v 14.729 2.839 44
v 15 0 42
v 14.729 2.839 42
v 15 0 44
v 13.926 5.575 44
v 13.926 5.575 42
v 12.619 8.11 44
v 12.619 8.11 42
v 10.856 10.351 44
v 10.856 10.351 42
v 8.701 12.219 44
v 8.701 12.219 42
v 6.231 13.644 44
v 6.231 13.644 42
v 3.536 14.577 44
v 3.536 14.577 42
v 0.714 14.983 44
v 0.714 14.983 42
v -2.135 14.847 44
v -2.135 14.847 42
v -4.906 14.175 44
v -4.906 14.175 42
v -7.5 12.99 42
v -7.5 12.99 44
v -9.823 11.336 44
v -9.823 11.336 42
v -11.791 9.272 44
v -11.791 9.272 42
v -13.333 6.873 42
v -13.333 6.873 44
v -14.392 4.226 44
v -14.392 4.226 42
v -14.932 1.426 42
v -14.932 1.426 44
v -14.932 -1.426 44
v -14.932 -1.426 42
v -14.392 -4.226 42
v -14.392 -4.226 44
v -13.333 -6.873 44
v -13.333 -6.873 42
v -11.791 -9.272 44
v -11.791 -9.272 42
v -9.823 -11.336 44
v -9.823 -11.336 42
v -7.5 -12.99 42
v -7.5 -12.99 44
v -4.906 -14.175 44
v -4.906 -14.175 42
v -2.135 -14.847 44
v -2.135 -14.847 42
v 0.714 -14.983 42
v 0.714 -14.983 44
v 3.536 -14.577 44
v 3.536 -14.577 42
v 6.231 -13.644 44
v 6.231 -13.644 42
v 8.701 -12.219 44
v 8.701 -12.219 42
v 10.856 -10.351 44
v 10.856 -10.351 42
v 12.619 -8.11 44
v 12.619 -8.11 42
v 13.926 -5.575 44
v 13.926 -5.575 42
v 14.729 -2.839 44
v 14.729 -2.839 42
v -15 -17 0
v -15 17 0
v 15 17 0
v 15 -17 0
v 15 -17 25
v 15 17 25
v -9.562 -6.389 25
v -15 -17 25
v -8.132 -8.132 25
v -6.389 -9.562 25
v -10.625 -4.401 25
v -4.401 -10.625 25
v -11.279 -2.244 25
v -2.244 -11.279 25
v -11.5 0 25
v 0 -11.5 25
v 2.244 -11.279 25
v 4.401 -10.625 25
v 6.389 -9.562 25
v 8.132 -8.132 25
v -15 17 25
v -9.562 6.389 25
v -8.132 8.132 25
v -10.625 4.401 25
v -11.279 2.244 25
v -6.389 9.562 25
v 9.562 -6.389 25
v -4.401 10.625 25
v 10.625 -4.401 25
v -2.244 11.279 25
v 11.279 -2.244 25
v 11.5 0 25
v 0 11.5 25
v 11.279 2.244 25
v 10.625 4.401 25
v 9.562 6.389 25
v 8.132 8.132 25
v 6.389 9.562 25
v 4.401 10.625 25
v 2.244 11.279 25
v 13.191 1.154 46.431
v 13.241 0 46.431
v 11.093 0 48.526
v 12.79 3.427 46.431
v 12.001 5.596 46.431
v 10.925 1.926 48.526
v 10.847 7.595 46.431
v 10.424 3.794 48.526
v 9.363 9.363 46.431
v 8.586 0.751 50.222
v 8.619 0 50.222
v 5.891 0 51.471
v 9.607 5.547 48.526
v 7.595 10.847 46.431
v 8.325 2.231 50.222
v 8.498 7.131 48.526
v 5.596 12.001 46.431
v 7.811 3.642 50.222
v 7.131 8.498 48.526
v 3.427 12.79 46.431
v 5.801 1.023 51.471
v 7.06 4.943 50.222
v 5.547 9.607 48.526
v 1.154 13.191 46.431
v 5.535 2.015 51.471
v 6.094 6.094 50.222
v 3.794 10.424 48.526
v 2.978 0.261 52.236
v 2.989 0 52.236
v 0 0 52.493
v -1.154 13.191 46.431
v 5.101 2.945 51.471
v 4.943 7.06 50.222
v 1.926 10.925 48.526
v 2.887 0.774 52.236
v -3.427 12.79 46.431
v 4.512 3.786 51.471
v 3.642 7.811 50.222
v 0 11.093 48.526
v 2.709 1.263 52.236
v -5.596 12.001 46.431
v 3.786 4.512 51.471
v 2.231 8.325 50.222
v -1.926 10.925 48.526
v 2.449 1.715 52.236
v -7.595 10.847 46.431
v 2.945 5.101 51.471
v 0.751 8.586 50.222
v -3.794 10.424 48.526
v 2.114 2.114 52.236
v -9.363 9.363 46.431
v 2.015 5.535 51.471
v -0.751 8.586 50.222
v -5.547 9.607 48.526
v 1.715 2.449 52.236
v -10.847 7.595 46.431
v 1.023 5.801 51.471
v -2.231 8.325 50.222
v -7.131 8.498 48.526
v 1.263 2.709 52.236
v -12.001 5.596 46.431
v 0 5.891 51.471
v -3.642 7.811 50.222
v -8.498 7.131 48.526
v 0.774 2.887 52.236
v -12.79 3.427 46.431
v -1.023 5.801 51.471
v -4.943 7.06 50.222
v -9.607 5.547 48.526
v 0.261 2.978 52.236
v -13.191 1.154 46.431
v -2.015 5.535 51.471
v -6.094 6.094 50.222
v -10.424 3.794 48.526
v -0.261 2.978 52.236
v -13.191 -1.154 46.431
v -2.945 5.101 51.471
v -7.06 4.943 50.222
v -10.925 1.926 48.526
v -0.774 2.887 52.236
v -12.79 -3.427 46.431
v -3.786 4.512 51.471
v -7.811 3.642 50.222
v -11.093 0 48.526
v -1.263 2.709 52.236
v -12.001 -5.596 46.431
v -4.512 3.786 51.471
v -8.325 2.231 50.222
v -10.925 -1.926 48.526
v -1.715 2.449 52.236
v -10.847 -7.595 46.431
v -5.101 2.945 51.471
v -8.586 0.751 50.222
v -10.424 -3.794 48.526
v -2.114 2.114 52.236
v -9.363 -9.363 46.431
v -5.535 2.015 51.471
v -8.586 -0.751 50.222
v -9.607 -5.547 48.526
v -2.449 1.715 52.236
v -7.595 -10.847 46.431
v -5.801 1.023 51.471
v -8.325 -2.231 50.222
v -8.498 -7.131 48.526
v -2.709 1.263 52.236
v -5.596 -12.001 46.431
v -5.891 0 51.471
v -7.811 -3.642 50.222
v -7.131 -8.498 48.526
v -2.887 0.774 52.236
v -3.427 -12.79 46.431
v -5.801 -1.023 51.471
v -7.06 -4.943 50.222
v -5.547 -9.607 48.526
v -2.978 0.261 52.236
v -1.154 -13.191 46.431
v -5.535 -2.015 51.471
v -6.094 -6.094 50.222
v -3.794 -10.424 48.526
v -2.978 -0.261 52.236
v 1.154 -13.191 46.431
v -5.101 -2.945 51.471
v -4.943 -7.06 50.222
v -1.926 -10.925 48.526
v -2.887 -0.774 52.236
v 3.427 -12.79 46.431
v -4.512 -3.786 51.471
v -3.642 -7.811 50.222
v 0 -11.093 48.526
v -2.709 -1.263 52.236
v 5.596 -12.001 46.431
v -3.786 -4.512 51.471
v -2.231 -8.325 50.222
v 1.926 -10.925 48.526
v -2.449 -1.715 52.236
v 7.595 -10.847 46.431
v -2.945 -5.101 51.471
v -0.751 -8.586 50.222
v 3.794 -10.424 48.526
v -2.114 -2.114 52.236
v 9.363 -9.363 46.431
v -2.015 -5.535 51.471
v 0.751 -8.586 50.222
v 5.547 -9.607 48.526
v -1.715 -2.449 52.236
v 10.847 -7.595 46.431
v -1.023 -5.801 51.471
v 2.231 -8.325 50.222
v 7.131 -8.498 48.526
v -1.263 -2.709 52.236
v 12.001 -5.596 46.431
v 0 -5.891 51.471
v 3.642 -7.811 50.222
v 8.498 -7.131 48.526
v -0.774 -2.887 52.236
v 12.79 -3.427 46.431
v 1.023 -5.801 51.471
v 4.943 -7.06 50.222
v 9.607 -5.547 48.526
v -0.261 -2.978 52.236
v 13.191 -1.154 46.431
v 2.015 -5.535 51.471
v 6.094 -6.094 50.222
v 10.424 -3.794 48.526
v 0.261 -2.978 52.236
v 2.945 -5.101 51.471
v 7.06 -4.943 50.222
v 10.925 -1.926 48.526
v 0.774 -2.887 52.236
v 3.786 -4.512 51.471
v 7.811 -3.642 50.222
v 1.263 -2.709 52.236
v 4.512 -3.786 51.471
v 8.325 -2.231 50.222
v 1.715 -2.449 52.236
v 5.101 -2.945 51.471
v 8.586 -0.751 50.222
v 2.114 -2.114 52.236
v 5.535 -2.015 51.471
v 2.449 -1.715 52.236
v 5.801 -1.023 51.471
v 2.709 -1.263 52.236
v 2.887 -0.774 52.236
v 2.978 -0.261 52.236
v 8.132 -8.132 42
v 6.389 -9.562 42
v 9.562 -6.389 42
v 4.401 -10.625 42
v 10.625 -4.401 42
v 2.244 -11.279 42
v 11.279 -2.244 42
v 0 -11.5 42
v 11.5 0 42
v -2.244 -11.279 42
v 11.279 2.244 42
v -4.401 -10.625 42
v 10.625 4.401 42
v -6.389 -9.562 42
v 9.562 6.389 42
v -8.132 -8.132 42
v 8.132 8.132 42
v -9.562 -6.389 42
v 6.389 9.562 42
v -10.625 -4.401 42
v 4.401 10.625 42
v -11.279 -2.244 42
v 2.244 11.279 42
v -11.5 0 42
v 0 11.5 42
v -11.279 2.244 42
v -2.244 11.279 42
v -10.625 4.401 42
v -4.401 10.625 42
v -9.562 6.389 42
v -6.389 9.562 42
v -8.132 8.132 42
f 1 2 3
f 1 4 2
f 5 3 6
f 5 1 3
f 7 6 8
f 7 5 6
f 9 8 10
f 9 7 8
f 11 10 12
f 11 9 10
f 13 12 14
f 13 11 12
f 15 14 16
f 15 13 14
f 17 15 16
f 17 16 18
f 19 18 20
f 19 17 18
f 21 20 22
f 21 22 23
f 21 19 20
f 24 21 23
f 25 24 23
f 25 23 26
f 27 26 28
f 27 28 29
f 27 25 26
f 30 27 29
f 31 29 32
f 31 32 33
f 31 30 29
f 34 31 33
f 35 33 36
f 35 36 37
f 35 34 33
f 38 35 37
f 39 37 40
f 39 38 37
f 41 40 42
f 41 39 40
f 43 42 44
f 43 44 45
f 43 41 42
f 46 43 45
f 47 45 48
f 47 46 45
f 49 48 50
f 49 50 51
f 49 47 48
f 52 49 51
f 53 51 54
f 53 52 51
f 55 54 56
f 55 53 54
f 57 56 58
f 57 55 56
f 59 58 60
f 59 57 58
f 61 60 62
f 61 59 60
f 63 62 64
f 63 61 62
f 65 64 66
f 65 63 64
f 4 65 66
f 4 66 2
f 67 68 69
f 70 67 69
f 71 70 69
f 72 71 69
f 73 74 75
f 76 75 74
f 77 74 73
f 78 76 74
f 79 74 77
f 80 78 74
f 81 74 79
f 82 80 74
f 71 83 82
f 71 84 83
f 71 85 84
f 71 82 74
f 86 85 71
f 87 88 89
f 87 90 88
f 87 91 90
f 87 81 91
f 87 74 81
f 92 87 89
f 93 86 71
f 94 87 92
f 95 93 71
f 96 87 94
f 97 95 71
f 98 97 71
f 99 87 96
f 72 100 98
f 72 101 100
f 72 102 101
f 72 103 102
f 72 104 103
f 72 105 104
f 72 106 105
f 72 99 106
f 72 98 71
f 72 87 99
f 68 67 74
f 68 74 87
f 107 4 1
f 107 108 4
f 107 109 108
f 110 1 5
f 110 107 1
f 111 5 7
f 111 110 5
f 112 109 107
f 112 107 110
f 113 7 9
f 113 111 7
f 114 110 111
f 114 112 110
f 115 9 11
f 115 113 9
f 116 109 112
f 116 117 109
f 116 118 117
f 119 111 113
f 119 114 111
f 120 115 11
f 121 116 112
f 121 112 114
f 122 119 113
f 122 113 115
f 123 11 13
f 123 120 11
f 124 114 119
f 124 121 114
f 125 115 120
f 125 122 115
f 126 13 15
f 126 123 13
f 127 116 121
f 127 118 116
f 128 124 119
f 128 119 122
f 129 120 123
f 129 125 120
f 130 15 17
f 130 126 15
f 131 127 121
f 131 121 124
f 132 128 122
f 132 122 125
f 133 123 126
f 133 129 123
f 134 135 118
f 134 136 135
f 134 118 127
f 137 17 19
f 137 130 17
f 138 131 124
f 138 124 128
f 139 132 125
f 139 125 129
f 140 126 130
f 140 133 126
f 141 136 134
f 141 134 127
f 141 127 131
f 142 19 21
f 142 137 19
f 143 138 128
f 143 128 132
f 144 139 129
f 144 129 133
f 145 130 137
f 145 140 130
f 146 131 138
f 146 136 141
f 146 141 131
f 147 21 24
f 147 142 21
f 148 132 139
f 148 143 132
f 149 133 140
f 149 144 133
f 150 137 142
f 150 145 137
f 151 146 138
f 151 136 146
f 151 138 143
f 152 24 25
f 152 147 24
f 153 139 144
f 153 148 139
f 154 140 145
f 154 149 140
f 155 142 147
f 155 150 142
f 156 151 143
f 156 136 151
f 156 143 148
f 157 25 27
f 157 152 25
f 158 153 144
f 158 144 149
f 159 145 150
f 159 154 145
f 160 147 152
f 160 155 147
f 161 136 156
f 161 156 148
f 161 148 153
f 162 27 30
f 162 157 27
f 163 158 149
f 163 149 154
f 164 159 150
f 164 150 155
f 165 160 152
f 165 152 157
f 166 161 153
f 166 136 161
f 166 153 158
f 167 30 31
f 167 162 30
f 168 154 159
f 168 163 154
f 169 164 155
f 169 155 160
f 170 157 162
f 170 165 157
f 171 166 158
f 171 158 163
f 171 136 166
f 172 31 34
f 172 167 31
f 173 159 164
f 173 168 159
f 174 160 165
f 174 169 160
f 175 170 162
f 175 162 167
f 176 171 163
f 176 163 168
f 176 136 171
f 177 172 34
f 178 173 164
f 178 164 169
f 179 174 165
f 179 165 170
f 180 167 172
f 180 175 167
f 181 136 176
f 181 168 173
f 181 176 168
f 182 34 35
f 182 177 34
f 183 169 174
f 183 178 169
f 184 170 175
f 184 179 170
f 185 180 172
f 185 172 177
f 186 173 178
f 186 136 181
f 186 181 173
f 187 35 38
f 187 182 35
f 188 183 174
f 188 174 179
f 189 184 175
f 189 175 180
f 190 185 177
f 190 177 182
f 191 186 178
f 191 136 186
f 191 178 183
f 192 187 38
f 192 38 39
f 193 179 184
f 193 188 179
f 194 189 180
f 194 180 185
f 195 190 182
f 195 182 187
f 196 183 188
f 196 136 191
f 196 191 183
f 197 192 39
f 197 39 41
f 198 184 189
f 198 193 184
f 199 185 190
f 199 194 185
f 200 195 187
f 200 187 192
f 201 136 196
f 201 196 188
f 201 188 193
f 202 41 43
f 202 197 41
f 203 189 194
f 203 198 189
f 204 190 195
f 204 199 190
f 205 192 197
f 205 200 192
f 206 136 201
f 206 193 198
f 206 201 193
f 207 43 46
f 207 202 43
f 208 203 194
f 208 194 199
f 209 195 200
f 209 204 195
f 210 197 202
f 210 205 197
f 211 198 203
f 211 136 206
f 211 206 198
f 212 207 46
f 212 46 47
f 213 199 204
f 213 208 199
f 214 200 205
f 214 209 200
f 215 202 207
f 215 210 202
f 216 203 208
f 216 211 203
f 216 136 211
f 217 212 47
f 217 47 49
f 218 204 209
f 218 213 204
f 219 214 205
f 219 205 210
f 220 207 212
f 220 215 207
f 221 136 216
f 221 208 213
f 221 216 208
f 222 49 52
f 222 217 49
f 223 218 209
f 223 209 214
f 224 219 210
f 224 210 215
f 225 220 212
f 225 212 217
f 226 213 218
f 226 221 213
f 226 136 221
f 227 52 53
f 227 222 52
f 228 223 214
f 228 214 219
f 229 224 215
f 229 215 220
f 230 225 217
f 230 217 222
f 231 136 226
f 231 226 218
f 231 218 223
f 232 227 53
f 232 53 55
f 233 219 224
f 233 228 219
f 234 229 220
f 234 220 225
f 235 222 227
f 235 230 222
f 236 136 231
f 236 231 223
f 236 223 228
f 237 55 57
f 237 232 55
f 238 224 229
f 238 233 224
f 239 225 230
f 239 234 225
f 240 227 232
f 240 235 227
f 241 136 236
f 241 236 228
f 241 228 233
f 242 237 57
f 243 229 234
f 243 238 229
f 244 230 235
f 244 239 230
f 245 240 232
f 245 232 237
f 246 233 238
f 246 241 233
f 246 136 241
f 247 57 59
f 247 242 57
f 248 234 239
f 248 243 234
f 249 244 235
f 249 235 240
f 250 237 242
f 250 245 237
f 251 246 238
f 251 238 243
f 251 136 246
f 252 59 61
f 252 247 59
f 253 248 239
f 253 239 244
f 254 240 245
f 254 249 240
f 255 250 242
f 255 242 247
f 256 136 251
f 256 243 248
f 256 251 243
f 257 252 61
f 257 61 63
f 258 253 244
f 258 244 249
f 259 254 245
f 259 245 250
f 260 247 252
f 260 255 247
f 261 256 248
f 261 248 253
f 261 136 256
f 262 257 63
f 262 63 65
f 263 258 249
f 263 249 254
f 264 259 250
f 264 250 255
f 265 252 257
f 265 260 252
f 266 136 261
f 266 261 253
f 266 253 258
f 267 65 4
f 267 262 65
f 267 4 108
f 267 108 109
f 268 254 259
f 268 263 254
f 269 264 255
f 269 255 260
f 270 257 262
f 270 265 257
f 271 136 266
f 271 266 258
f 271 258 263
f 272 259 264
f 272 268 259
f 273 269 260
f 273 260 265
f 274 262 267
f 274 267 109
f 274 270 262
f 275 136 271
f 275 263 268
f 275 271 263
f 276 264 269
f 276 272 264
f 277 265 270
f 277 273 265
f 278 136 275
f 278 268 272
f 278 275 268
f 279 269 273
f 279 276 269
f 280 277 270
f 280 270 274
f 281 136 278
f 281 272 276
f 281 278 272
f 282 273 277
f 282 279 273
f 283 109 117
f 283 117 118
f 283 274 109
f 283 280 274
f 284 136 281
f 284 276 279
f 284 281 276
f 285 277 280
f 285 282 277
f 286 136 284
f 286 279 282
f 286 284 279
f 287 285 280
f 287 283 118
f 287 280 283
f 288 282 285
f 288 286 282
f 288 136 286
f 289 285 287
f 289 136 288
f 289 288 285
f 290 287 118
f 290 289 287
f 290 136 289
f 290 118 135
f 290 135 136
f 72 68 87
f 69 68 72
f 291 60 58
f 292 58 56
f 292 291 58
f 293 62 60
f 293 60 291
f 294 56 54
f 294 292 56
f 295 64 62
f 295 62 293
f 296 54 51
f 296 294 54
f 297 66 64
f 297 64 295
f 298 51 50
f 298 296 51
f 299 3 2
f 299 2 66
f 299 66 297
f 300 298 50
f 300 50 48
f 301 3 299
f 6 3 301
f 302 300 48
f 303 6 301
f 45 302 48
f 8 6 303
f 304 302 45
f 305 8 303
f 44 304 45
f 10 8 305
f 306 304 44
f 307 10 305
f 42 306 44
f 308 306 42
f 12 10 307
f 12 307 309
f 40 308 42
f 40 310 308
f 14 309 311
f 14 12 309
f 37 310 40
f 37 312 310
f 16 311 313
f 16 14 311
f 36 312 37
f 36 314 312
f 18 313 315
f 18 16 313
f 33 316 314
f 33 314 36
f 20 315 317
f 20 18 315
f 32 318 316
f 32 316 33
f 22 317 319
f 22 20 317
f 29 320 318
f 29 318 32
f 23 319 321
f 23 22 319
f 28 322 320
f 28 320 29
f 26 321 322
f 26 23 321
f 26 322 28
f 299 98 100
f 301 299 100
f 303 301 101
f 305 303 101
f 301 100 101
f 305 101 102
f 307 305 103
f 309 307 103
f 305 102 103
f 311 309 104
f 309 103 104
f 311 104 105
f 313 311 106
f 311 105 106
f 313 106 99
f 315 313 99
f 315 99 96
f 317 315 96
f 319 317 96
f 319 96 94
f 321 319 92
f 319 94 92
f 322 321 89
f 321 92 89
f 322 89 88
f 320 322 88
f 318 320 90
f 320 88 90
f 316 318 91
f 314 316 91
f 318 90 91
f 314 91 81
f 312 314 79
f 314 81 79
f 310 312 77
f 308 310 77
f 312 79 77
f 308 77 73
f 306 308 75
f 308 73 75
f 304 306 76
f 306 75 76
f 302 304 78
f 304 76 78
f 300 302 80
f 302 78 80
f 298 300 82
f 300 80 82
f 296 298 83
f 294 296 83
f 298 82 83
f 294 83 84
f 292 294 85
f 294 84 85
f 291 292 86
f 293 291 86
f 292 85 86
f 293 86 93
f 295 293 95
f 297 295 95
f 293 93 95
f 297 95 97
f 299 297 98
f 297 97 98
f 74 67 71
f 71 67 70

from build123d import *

# Parameters (mm, degrees)
SKETCH_1_W      = 30
SKETCH_1_H      = 34
EXTRUDE_1_DEPTH = 25
SKETCH_2_R      = 11.5
EXTRUDE_2_DEPTH = 17


with BuildPart() as part:
    # 草图1 → 凸台-拉伸1 (new body)
    with BuildSketch(Plane.XY):
        Rectangle(SKETCH_1_W, SKETCH_1_H)
    extrude(amount=EXTRUDE_1_DEPTH)

    # 草图2 → 凸台-拉伸2 (add)
    with BuildSketch(Plane.XY.offset(25)):
        Circle(SKETCH_2_R)
    extrude(amount=EXTRUDE_2_DEPTH)

    # 草图3 → 旋转1 (revolve)
    with BuildSketch(Plane(origin=(0, 0, 0), x_dir=(1, 0, 0), z_dir=(0, 1, 0))):
        with BuildLine():
            Line((0, -42), (15, -42))
            Line((15, -42), (15, -44))
            ThreePointArc((15, -44), (8.618709266, -50.222281386), (0, -52.492855685))
            Line((0, -52.492855685), (0, -42))
        make_face()
    revolve(axis=Axis((0, 0, 42), (0, 0, 1)))


solid = part.part
